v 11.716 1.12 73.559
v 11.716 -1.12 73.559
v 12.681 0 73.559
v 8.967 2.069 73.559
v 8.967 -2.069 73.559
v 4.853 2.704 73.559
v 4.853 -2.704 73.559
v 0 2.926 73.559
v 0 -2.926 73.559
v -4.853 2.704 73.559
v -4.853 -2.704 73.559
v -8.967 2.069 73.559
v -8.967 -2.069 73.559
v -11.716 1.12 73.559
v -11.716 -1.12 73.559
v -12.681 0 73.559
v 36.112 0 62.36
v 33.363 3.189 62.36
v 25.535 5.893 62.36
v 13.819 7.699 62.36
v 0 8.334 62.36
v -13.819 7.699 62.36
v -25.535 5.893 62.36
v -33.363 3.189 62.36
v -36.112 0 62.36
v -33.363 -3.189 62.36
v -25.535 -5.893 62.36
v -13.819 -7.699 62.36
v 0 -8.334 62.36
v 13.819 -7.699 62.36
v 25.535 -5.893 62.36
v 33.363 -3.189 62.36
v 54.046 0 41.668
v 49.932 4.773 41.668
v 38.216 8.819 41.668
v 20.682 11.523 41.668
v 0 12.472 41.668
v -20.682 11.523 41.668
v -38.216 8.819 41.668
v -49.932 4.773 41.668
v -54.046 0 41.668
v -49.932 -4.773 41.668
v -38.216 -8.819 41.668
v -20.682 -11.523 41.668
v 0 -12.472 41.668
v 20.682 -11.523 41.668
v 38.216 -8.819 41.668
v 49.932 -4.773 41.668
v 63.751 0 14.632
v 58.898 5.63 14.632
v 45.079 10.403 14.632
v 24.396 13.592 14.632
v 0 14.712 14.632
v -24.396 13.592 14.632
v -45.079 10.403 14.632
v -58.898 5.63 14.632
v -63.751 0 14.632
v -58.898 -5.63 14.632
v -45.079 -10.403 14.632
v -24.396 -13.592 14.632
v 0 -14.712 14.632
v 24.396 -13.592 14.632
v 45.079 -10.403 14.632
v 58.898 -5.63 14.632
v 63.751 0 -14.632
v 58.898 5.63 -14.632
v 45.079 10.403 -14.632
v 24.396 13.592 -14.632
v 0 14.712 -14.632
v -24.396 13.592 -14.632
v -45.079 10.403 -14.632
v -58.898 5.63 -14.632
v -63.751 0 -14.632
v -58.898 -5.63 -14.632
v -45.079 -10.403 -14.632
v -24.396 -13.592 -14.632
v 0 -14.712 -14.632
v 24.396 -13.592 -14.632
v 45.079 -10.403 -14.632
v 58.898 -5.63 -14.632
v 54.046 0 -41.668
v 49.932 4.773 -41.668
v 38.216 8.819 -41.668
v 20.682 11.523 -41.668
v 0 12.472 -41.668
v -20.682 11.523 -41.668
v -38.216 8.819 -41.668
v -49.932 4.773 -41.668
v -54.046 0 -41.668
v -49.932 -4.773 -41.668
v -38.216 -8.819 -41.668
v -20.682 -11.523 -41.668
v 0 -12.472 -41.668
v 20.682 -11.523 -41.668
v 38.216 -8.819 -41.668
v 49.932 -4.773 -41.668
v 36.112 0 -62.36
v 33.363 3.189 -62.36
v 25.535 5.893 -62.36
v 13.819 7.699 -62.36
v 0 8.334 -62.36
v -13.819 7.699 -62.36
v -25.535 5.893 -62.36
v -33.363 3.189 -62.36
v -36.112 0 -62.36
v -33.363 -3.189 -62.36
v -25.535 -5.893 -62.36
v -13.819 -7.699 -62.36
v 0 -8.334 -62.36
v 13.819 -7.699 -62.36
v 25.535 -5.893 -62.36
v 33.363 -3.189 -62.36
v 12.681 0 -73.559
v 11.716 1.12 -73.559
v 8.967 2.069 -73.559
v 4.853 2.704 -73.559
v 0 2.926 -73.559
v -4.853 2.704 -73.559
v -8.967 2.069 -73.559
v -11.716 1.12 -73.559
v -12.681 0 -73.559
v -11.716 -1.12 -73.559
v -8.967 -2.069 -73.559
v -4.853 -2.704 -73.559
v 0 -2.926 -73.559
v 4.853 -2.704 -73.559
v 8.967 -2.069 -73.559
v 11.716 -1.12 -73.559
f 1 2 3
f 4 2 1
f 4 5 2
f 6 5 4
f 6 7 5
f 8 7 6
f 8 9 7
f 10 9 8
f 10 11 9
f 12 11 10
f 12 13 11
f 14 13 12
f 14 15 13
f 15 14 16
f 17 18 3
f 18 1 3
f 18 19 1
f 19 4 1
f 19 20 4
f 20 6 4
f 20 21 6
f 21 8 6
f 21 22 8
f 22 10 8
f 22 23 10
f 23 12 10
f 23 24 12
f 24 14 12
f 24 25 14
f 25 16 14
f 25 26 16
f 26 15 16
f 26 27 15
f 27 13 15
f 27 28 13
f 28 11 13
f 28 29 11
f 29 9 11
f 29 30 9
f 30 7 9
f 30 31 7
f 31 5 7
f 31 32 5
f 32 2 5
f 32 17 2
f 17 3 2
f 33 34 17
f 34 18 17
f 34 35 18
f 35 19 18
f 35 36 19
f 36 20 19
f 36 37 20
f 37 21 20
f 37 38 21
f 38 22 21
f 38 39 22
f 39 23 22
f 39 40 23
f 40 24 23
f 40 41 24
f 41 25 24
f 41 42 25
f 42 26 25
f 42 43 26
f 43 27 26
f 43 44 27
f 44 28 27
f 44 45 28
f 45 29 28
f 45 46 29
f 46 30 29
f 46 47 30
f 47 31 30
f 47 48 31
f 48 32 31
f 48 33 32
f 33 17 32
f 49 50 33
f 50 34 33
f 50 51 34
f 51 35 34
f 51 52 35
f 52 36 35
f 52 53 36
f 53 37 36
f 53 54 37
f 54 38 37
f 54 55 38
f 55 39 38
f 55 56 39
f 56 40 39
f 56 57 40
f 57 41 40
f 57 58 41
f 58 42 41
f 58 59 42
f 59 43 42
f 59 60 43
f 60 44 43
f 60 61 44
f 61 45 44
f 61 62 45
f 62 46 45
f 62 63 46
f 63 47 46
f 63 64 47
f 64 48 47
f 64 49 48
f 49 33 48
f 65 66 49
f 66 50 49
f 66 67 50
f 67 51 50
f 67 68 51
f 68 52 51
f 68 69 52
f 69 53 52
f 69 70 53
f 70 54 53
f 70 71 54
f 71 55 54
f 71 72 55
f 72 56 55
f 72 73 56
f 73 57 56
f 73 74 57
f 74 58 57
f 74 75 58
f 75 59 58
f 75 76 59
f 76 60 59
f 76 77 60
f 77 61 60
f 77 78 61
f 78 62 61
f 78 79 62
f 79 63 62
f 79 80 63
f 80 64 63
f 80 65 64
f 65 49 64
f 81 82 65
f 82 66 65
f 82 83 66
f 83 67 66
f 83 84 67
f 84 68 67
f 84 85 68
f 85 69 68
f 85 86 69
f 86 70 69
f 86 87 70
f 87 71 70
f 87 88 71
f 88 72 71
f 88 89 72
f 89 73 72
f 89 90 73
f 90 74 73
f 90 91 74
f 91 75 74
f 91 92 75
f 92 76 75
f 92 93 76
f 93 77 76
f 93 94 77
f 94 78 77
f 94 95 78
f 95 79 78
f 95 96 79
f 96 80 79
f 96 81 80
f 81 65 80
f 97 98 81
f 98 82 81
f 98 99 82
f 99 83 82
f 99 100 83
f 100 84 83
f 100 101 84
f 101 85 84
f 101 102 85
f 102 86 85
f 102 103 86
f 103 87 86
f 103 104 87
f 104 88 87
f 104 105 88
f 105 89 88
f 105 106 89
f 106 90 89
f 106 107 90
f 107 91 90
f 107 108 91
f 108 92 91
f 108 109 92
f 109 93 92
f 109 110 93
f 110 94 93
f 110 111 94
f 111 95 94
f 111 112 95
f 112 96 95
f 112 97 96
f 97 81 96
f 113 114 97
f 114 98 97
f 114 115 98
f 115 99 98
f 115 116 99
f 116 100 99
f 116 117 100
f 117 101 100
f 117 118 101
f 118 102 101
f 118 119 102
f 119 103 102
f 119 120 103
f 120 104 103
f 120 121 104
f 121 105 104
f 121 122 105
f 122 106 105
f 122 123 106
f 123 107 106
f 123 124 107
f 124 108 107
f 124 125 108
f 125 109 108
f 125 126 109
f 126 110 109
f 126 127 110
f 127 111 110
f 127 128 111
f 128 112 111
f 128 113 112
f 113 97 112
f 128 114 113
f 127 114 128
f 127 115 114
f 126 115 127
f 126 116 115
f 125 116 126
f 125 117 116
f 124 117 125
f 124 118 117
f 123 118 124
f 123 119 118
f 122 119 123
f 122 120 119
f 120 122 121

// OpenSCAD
// Generated by SolidPython 1.0.1 on 2020-07-29 00:46:50


scale(v = [13, 3, 15]) {
	sphere(r = 5);
}
/***********************************************
*********      SolidPython code:      **********
************************************************
 
# import packages: SolidPython
from solid import *
from solid.utils import *
from itertools import chain, combinations, permutations


class Resize:

    def __init__(self, scad_file):
        self.scad_file = scad_file
        #self.scad_file = import_scad(scad_file)
        # cone/cylinder param:
        self.r1 = 0
        self.r2 = 0
        self.h = 0
        # rectangular prism param:
        self.w = 0
        self.l = 0
        # ellipse param:
        self.r = 0

    # import OpenScad code (file name corresponds to shape)


    # classify shape + parameters
    def assign(self, param1, param2, param3):
        if self.scad_file == 'cone.scad':
            self.r1 = param1
            self.r2 = param2
            self.h = param3
        elif self.scad_file == 'cylinder.scad':
            self.r1 = param1
            self.r2 = param2
            self.h = param3
        elif self.scad_file == 'rectangularPrism.scad':
            self.h = param1
            self.l = param2
            self.w = param3
        else:
            self.r = param1
            self.h = param2

    # resize parameters
    def iterate(self):
        x = range(3, 20, 2)
        i = 1
        if self.scad_file == 'cone.scad':
            tempList = list(permutations(x, 2))
            for temp in tempList:
                param1 = temp[0]
                param2 = temp[1]
                filepath = 'produced_scad_files/' + 'cone' + str(param1) + '_' + str(param2) + '_' + '.scad'
                scad_render_to_file(cylinder(h=param1, r1=param2, r2=0), filepath)

        elif self.scad_file == 'cylinder.scad':
            tempList = list(permutations(x, 3))
            for temp in tempList:
                param1 = temp[0]
                param2 = temp[1]
                filepath = 'produced_scad_files/' + 'cylinder' + str(param1) + '_' + str(param2) + '_' + '.scad'
                scad_render_to_file(cylinder(h=param1, r1=param2, r2=param2), filepath)

        elif self.scad_file == 'rectangularPrism.scad':
            tempList = list(permutations(x, 3))
            for temp in tempList:
                param1 = temp[0]
                param2 = temp[1]
                param3 = temp[2]
                filepath = 'produced_scad_files/' + 'rectangularPrism' + str(param1) + '_' + str(param2) + '_' + str(
                    param3) + '.scad'
                scad_render_to_file(cube(size=(param1, param2, param3)), filepath)

        elif self.scad_file == 'ellipse.scad':
            tempList = list(permutations(x, 4))
            for temp in tempList:
                param1 = temp[0]
                param2 = temp[1]
                param3 = temp[2]
                param4 = temp[3]
                filepath = 'produced_scad_files/' + 'ellipse' + str(param1) + '_' + str(param2) + '_' + str(param3) + '_' + str(param4) + '.scad'
                scad_render_to_file(scale([param1, param2, param3])(sphere(r=param4)), filepath)

    def render_to_scadfile(self):
        scad_render_to_file(scad, 'example.scad') 
 
************************************************/
